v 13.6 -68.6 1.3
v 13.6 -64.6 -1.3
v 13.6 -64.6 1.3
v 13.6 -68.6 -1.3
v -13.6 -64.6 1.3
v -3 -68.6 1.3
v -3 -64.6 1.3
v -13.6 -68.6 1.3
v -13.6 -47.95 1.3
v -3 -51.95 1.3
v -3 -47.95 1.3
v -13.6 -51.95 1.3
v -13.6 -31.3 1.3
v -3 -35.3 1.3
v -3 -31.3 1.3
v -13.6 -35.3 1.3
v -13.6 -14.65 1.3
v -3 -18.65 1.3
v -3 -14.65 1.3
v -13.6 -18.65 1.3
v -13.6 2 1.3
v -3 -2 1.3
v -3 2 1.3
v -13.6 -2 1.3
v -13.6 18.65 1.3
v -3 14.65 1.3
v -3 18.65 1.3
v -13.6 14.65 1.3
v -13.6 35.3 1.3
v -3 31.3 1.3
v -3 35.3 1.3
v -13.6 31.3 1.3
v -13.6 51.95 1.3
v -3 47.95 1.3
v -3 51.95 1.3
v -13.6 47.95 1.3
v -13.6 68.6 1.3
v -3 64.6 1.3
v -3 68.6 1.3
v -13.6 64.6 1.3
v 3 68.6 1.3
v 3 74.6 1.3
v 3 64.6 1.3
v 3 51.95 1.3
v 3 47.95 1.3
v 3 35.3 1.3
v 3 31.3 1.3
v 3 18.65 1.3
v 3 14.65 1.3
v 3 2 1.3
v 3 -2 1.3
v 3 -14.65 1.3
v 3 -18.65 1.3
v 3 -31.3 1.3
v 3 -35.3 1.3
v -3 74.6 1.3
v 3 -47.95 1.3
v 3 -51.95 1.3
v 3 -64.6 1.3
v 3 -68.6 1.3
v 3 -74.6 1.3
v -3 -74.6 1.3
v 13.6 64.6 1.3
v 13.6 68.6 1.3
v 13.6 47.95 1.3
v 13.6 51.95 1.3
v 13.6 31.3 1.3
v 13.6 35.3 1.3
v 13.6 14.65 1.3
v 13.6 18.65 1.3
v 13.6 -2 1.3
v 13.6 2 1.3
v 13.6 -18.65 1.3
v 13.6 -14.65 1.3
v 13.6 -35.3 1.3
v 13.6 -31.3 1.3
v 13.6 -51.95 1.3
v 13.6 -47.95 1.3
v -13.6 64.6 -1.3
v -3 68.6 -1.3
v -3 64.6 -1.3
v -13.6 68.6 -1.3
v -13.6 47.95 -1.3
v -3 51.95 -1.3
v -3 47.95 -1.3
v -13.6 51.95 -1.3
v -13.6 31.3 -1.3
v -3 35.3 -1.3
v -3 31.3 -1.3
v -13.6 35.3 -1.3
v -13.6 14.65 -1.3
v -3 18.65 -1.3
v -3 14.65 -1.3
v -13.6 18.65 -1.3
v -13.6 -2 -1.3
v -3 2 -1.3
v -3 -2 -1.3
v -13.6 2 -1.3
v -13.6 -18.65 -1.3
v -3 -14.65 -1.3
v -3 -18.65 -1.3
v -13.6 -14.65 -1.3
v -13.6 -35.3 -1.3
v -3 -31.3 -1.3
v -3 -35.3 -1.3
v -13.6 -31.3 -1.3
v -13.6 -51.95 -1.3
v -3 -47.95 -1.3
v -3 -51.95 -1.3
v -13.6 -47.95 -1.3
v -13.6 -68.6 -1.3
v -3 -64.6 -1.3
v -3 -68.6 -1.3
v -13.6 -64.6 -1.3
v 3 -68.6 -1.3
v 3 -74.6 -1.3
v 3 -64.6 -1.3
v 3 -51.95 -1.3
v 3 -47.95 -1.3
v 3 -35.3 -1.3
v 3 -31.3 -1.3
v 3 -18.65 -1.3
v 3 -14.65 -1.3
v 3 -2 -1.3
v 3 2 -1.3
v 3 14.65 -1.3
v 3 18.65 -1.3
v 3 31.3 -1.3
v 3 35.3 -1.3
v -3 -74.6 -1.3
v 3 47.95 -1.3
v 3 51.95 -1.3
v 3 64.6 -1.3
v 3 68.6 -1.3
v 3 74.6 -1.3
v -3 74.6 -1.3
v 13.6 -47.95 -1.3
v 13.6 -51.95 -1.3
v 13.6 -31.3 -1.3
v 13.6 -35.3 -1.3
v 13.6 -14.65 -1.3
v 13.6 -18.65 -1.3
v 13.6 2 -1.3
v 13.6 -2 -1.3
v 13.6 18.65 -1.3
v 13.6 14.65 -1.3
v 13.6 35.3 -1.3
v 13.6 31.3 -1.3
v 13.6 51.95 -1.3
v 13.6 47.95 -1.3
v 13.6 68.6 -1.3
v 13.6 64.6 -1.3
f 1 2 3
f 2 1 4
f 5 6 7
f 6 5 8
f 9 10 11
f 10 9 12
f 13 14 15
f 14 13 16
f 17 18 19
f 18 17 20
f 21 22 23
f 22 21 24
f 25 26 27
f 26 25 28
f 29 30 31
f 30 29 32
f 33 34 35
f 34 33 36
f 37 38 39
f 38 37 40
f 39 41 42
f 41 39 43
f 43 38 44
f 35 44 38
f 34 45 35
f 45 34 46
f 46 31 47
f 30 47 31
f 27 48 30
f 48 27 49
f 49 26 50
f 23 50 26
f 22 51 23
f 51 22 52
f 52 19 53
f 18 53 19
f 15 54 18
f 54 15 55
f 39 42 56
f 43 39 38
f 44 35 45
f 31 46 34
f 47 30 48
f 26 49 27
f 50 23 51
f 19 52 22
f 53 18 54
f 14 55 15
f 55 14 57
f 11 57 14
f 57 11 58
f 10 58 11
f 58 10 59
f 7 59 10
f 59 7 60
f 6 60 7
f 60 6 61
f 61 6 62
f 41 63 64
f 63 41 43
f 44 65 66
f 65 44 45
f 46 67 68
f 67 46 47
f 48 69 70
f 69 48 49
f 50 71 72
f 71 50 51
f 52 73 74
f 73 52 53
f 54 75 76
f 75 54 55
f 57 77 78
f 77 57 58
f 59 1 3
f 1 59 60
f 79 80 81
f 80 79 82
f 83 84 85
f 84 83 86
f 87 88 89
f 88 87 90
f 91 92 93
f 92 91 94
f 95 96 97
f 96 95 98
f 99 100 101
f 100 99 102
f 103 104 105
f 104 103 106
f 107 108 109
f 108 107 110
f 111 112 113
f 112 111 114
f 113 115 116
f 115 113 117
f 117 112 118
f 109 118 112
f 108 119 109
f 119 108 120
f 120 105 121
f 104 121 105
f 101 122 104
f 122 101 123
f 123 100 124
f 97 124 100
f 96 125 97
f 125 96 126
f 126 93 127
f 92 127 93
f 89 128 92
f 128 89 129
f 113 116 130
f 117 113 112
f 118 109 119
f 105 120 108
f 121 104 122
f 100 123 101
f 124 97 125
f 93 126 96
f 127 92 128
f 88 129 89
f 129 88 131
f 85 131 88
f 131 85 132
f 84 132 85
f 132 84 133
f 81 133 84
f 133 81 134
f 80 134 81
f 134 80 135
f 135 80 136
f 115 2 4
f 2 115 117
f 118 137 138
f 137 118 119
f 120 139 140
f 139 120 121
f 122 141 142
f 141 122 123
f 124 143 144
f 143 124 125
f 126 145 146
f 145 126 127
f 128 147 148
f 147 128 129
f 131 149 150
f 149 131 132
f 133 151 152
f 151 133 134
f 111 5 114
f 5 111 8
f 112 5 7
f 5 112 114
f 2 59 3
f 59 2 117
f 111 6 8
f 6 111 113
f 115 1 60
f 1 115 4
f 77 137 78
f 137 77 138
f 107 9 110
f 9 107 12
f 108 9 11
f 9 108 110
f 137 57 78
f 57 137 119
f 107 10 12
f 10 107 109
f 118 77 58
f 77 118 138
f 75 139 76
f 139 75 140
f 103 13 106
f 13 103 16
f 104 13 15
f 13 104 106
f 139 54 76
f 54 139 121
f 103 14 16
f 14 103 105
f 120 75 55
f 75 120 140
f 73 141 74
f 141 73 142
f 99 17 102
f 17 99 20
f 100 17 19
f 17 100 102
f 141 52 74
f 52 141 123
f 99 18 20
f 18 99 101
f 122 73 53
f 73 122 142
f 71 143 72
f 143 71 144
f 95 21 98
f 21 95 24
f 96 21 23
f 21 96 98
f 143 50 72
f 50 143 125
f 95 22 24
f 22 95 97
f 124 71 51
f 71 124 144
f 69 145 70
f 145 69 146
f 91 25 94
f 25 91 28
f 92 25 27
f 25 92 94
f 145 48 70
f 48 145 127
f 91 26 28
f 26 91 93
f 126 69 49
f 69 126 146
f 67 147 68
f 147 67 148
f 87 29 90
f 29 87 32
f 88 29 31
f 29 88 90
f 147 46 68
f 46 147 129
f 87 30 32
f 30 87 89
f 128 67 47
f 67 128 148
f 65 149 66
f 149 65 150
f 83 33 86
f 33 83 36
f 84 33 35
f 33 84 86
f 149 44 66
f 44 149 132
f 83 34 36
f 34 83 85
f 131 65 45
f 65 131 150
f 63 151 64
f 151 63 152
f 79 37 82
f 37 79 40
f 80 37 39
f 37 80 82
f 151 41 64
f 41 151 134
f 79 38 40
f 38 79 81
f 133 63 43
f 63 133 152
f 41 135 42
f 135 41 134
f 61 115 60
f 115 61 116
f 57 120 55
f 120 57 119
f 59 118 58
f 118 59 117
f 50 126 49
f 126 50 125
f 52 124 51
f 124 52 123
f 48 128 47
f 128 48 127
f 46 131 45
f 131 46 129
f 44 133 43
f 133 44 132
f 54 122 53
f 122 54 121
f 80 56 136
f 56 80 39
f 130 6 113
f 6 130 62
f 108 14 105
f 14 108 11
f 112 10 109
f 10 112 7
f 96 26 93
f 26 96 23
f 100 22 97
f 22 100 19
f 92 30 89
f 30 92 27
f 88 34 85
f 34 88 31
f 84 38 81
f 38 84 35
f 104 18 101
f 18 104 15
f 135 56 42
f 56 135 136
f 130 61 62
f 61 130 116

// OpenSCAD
$fn=64;

L = 149.2;
W = 27.2;
T = 2.6;

spine_w = 6.0;
tab_w = W;
tab_h = 4.0;

n_tabs = 9;
end_margin = 8.0;

module spine() {
    cube([spine_w, L, T], center=true);
}

module tab_at(ypos) {
    translate([0, ypos, 0])
        cube([tab_w, tab_h, T], center=true);
}

module rack() {
    union() {
        spine();
        for (i = [0 : n_tabs-1]) {
            y = -L/2 + end_margin + (L - 2*end_margin) * (i/(n_tabs-1));
            tab_at(y);
        }
    }
}

rack();
